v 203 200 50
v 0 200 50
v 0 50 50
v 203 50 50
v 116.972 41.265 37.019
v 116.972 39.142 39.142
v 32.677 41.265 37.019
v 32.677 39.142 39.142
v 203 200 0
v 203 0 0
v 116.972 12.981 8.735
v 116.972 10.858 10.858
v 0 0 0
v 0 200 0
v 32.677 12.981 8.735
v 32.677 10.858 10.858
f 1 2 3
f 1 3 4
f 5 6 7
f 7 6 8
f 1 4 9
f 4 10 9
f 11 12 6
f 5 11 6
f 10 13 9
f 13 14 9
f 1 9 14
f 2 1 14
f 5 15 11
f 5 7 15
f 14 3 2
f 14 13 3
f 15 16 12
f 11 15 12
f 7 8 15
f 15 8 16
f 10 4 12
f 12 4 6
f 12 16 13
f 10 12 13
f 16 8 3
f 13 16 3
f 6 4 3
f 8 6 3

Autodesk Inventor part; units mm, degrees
ref_plane "YZ Plane" through (0, 0, 0) normal (1, 0, 0) x (0, 1, 0)
ref_plane "XZ Plane" through (0, 0, 0) normal (0, 1, 0) x (-1, 0, 0)
ref_plane "XY Plane" through (0, 0, 0) normal (0, 0, 1) x (1, 0, 0)
sketch "Sketch1" plane through (0, 0, 0) normal (0, 0, 1) x (1, 0, 0)
  line L0 (-40.6, 0) -> (243.6, 0) projected
  line L1 (0, -40) -> (0, 240) projected
  line L2 (0, 0) -> (203, 0)
  line L3 (203, 0) -> (203, 200)
  line L4 (203, 200) -> (0, 200)
  line L5 (0, 200) -> (0, 0)
  dimension "d0" = 203
  dimension "d1" = 200
extrude "Extrusion1" add sketch "Sketch1" along normal blind 50
chamfer "Chamfer1" distance 50 angle 45 1 edges at (101.5, 0, 50)
sketch "Sketch4" plane through (0, 50, 50) normal (0, -0.7071, 0.7071) x (1, 0, 0)
  line L0 (32.6771, -55.3553) -> (116.9718, -55.3553)
  line L1 (116.9718, -55.3553) -> (116.9718, -15.3553)
  line L2 (116.9718, -15.3553) -> (32.6771, -15.3553)
  line L3 (32.6771, -15.3553) -> (32.6771, -55.3553)
extrude "Extrusion4" cut sketch "Sketch4" against normal blind 3
properties part number "hotbody"
